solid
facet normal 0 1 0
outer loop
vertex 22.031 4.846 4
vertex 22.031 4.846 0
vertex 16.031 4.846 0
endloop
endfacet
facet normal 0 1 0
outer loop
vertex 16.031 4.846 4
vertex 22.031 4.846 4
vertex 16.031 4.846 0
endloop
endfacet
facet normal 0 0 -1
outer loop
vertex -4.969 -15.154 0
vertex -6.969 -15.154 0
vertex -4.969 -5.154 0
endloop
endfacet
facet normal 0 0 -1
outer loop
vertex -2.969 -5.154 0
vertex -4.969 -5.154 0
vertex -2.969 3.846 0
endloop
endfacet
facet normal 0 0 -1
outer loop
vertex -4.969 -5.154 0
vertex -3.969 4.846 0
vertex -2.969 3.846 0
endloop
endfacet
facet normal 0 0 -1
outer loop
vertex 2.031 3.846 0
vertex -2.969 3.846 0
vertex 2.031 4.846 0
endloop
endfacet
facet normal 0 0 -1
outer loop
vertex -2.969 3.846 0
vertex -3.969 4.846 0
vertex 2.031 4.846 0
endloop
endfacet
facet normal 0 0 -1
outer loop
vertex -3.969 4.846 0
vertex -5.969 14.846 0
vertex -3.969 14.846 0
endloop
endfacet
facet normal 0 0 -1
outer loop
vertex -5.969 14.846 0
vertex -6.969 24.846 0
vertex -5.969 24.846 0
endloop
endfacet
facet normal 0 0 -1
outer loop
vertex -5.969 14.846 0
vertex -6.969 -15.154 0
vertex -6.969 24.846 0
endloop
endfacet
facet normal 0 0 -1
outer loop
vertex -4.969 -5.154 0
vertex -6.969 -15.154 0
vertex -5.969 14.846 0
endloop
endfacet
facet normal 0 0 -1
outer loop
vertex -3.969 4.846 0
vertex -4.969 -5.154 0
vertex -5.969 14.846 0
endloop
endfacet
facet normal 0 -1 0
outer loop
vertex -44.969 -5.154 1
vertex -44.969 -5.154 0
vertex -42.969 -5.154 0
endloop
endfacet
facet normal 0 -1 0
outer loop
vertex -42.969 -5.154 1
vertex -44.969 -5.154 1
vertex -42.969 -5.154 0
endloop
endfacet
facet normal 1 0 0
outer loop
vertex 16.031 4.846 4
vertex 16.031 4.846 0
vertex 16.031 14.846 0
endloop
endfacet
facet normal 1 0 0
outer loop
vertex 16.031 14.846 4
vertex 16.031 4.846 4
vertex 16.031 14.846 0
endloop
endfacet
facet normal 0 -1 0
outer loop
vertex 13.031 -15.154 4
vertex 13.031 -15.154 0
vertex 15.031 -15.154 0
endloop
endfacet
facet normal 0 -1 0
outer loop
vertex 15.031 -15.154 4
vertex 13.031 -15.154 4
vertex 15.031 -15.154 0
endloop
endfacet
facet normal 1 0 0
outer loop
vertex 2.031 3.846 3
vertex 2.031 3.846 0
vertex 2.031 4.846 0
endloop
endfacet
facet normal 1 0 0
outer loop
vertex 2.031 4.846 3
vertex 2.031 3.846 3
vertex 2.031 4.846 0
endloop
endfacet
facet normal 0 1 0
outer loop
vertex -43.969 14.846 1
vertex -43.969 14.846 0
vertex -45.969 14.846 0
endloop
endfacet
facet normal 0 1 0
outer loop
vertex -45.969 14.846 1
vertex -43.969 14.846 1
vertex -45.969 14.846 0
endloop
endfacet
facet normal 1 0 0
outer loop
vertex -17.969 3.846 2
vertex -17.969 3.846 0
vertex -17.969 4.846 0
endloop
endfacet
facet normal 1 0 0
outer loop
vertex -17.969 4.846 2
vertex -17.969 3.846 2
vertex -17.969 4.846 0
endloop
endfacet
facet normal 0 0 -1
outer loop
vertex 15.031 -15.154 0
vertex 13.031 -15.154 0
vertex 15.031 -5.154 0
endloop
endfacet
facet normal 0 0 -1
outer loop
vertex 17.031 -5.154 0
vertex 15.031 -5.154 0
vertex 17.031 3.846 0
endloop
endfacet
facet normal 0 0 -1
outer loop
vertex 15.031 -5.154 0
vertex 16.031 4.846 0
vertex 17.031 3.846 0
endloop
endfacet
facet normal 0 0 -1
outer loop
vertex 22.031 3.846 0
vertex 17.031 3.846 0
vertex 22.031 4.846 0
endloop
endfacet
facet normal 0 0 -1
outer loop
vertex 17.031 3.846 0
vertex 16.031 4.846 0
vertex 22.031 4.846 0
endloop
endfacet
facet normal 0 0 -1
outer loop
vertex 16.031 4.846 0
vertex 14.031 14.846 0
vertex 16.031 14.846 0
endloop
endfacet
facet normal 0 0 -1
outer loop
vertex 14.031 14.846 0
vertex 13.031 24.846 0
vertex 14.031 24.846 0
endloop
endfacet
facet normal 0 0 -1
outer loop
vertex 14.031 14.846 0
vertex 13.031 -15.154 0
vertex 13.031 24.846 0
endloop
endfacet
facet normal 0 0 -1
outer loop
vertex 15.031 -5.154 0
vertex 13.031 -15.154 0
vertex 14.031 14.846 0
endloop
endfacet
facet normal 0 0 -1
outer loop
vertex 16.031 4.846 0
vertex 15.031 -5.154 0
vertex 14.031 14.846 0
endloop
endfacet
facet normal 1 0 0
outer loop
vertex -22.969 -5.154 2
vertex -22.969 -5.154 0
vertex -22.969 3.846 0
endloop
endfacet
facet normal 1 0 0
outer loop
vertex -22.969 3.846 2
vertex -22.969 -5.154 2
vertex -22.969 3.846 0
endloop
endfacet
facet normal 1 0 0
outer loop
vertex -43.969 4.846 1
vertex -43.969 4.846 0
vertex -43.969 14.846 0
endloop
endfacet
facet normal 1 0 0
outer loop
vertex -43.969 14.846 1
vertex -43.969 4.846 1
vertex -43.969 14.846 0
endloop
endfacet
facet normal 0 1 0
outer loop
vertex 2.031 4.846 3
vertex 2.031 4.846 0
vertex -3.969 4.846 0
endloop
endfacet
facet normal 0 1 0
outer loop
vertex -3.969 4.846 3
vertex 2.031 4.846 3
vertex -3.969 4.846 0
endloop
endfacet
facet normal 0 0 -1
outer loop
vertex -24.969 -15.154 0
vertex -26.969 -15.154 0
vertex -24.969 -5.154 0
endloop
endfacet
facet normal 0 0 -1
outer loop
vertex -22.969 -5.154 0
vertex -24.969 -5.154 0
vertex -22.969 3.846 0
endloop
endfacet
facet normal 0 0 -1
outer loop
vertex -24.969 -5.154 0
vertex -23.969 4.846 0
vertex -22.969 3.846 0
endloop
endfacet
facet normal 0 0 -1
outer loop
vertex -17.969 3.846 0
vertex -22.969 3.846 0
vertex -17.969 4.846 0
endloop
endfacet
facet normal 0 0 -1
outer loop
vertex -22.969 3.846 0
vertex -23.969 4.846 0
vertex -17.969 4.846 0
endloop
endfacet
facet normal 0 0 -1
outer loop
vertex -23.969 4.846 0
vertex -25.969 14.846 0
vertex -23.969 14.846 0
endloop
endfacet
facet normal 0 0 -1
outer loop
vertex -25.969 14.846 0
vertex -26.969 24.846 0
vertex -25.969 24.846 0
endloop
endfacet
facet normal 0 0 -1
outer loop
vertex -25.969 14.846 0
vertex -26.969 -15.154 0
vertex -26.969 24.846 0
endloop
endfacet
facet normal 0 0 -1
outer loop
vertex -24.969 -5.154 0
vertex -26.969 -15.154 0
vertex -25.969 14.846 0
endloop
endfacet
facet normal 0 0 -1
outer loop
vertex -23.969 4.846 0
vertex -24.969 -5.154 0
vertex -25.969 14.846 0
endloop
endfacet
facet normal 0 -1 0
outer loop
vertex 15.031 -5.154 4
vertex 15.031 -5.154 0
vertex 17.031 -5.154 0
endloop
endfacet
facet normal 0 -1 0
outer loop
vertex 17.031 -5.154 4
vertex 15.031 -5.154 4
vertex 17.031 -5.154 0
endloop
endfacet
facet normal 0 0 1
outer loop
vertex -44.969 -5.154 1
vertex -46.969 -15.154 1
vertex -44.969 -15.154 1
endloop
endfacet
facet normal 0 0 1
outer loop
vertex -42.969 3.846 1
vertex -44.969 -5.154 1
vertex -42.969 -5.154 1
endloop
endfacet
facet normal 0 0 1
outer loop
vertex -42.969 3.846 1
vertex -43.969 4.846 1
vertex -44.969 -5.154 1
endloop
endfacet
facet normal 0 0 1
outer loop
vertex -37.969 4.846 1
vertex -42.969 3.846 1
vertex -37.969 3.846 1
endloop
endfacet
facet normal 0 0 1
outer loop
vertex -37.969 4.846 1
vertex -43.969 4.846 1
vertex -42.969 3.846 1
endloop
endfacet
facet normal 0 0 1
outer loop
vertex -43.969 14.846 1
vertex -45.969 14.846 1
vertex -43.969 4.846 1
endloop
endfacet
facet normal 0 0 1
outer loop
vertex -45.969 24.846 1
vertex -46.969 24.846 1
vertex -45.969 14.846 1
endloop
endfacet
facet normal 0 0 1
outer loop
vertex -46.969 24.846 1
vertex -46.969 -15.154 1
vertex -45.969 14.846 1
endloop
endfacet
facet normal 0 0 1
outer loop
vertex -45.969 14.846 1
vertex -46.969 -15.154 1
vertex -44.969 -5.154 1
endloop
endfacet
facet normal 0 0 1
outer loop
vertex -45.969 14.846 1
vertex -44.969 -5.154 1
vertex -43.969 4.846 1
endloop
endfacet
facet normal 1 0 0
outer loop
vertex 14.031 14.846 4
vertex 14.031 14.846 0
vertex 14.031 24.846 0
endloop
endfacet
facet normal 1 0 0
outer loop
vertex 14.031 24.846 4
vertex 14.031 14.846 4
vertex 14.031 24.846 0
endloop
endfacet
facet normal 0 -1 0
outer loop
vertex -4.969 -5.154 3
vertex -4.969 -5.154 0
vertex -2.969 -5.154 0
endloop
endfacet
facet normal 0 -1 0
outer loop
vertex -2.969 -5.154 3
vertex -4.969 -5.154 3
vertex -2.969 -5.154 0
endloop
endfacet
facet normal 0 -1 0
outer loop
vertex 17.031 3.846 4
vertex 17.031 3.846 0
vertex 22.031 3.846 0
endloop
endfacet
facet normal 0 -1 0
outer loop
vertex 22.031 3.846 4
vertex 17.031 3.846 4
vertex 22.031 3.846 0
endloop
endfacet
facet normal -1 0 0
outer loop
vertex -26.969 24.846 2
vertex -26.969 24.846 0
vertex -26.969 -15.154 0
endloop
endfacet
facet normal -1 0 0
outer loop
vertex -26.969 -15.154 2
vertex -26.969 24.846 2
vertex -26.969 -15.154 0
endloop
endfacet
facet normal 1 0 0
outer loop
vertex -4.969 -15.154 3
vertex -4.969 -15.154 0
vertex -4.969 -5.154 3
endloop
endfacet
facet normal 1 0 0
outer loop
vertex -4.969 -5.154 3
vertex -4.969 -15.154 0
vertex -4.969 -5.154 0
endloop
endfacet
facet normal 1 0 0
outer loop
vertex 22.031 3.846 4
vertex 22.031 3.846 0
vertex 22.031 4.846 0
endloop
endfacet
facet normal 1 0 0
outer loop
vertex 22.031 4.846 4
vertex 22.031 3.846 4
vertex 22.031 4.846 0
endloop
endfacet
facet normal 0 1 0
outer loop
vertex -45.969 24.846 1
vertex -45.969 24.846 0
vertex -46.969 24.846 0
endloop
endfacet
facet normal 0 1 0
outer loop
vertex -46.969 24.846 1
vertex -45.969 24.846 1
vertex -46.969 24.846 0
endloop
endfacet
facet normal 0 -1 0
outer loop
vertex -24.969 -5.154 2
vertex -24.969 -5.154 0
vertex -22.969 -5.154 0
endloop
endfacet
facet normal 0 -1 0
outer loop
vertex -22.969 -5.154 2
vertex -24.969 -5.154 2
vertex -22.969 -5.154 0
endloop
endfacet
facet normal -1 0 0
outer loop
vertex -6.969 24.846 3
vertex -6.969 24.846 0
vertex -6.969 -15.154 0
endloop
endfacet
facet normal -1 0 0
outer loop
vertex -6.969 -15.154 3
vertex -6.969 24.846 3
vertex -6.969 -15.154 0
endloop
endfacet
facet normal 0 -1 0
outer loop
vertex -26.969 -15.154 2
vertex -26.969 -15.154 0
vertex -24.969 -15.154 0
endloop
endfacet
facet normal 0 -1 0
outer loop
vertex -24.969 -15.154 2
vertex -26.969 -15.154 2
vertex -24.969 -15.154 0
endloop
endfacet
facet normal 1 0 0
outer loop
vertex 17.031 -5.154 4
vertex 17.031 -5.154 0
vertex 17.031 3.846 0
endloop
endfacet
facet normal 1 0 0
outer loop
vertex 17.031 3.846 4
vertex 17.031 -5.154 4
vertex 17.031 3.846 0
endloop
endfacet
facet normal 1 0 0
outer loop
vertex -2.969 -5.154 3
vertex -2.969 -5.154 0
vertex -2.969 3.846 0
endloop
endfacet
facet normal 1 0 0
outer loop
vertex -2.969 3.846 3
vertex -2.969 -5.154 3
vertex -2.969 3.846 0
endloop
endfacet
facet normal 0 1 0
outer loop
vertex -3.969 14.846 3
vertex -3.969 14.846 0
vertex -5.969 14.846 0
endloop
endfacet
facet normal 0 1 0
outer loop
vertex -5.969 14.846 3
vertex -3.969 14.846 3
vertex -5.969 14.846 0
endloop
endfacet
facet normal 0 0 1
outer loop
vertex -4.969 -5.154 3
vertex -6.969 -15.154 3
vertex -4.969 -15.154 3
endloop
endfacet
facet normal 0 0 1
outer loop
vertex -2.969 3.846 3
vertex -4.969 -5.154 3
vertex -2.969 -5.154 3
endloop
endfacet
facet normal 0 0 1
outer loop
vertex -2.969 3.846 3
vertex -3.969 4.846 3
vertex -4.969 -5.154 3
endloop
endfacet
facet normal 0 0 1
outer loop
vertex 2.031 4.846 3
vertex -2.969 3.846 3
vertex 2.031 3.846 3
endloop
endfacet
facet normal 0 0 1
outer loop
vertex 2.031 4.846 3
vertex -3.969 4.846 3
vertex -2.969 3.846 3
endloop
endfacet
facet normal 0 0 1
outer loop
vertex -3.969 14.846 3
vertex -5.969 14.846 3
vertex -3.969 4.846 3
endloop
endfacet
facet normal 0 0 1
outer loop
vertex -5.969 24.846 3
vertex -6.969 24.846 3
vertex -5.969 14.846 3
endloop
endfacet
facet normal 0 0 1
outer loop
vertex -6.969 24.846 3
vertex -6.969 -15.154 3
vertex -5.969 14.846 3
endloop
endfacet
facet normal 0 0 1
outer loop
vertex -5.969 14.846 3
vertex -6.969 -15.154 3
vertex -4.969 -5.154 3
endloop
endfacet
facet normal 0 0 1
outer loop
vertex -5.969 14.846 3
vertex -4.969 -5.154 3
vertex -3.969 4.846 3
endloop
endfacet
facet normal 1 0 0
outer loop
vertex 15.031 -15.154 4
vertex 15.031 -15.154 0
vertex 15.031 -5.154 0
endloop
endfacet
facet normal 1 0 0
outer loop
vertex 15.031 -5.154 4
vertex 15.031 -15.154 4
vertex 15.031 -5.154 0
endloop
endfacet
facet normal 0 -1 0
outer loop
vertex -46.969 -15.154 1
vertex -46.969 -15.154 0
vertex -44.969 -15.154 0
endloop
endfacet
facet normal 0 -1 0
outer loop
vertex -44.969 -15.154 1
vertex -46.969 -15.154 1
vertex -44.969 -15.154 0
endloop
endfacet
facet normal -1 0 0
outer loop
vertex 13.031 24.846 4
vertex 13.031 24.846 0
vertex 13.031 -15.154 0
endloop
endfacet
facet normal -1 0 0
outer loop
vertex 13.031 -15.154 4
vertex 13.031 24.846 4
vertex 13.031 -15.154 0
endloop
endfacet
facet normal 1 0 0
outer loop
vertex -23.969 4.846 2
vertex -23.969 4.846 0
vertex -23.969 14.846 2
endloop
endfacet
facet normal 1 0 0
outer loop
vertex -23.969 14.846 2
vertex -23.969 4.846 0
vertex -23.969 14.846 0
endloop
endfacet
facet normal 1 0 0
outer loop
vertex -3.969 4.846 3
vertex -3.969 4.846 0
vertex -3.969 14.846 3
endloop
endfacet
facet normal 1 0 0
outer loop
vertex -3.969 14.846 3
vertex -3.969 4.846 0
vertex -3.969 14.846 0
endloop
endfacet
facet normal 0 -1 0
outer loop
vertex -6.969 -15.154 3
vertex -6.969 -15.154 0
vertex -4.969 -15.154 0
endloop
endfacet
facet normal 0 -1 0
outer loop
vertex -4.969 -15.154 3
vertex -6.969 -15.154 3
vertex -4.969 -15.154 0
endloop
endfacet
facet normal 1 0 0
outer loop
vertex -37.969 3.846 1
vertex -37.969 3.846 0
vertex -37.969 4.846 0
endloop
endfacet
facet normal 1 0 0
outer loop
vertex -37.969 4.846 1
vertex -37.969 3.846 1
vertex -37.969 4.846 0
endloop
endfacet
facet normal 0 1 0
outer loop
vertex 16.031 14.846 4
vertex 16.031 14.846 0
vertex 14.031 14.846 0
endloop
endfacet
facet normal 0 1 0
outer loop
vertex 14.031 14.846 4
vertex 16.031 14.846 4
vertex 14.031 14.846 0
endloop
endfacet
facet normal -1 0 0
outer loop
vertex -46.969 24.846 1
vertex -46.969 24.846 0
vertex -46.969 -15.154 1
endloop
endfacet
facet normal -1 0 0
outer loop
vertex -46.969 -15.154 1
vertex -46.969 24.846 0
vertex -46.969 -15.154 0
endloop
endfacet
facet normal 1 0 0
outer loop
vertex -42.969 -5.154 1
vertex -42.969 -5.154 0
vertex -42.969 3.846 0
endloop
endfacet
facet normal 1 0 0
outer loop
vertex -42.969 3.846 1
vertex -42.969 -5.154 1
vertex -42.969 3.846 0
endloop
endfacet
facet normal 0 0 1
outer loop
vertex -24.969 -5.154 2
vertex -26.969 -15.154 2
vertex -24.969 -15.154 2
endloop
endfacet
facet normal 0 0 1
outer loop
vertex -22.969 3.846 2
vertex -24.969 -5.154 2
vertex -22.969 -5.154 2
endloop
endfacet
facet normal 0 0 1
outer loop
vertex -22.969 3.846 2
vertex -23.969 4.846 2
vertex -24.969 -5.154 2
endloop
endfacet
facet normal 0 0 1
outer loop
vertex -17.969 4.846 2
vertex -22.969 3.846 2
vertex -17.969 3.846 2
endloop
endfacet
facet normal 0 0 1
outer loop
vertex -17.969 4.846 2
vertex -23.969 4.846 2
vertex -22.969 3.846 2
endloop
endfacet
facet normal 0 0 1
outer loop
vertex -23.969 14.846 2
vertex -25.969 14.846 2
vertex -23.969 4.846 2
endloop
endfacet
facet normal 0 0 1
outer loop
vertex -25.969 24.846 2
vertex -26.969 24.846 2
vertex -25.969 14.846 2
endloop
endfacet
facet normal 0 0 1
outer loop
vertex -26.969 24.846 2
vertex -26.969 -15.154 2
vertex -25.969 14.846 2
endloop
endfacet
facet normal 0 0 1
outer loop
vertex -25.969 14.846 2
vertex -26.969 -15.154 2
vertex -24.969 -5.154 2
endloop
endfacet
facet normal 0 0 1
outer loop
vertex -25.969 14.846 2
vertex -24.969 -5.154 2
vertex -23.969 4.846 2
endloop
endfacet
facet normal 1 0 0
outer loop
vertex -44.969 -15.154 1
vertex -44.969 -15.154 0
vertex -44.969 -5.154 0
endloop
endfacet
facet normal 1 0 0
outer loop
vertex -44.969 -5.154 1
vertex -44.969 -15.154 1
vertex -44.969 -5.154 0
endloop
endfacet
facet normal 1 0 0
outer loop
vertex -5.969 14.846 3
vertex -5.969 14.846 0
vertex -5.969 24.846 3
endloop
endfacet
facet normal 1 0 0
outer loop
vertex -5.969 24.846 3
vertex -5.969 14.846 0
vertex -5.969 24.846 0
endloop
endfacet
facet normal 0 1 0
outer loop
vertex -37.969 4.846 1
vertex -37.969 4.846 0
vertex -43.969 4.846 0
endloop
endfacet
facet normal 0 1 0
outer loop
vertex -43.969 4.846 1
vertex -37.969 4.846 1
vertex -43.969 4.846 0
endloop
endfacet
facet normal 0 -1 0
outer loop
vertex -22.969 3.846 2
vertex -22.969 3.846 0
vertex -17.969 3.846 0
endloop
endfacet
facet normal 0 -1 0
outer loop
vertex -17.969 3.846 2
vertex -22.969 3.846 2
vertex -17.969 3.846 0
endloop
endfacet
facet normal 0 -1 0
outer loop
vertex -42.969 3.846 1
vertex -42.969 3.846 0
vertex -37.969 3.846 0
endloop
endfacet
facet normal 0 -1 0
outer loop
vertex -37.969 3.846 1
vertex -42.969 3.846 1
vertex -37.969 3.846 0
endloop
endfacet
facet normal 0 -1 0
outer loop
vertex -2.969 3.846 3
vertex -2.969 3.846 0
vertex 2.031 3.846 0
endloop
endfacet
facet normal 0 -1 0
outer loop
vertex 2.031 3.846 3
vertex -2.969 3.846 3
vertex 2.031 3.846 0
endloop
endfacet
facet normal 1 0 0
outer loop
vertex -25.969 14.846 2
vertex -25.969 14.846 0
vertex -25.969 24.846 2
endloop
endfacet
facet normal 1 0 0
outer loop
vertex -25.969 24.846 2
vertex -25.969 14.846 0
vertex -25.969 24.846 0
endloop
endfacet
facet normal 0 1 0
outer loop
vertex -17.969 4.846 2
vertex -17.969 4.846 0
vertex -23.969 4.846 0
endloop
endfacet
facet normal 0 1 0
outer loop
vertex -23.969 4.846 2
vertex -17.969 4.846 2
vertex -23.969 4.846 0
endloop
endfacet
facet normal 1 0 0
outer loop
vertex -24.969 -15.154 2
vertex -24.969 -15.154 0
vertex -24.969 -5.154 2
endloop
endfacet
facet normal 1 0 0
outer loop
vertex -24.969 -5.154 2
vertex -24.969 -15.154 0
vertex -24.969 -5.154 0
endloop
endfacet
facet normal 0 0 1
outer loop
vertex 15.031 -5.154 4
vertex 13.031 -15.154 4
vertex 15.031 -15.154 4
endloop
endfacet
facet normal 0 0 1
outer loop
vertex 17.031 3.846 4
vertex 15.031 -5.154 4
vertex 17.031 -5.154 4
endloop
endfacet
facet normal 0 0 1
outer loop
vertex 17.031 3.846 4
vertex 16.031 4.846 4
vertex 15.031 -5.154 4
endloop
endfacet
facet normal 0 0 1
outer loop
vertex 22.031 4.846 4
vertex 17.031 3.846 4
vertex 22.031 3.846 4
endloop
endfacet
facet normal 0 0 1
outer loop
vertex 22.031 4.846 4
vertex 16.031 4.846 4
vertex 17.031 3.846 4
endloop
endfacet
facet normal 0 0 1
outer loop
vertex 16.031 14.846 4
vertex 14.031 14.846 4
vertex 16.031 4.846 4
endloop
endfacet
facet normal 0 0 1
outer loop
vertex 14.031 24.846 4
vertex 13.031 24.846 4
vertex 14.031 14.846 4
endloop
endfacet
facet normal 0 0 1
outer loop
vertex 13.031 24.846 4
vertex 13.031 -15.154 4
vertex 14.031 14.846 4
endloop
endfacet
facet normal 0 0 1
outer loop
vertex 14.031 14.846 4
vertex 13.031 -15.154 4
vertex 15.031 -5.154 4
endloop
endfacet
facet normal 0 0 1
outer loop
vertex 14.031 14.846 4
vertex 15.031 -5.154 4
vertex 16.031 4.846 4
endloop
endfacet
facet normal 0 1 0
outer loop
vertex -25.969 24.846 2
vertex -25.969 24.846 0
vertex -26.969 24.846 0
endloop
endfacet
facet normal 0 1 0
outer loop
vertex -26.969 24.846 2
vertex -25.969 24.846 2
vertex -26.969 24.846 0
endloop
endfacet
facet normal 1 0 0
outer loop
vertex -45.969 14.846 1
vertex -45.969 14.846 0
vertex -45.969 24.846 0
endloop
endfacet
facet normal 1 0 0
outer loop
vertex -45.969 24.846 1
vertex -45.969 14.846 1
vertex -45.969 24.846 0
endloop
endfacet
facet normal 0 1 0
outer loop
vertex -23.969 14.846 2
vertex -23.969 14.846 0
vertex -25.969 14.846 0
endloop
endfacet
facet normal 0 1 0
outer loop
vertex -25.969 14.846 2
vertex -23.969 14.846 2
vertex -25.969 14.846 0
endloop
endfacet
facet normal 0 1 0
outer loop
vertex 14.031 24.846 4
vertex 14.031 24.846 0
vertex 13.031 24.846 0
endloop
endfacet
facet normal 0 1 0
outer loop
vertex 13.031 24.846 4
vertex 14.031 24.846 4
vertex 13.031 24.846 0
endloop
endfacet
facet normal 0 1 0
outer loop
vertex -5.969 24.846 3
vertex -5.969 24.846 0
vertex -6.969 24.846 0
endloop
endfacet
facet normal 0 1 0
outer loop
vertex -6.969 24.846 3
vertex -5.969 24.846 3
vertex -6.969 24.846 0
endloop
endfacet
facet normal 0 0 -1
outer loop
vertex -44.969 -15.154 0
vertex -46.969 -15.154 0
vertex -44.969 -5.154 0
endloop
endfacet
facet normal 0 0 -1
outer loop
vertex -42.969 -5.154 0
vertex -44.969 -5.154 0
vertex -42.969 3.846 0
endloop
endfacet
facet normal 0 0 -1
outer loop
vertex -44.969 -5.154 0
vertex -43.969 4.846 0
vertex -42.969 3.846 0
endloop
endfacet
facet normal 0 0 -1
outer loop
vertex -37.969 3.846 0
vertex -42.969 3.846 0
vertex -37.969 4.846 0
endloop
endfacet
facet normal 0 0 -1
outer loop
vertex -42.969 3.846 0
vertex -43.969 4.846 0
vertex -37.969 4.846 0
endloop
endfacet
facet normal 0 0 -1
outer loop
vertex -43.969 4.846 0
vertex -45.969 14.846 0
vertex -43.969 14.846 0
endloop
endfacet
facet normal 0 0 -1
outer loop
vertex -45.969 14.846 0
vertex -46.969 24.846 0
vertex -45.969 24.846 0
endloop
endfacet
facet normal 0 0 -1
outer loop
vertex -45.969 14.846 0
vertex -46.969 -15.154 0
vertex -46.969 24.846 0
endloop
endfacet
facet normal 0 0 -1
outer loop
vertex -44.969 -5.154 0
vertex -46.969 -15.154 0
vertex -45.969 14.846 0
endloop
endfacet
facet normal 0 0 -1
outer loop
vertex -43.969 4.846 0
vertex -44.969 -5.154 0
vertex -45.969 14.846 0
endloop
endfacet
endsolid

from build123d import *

# Parameters (mm, degrees)
F1_DEPTH = 1
F2_DEPTH = 2
F3_DEPTH = 3
F4_DEPTH = 4


with BuildPart() as f1:
    # F0 (on Top) → F1 (new body)
    with BuildSketch(Plane.XY):
        Polygon((-45.969496, 24.845806), (-46.969496, 24.845806), (-46.969496, -15.154194), (-45.969496, -15.154194), (-45.969496, 14.845806), align=None)
        Polygon((-44.969496, 14.845806), (-45.969496, 14.845806), (-45.969496, -15.154194), (-44.969496, -15.154194), (-44.969496, -5.154194), align=None)
        Polygon((-43.969496, 14.845806), (-44.969496, 14.845806), (-44.969496, -5.154194), (-43.969496, -5.154194), (-43.969496, 4.845806), align=None)
        Polygon((-43.969496, 4.845806), (-43.969496, -5.154194), (-42.969496, -5.154194), (-42.969496, 3.845806), (-42.969496, 4.845806), align=None)
        Polygon((-37.969496, 4.845806), (-42.969496, 4.845806), (-42.969496, 3.845806), (-39.983839, 3.845806), (-37.969496, 3.845806), align=None)
    extrude(amount=F1_DEPTH)


with BuildPart() as f2:
    # F0 (on Top) → F2 (new body)
    with BuildSketch(Plane.XY):
        Polygon((-25.969496, 14.845806), (-25.969496, 24.845806), (-26.969496, 24.845806), (-26.969496, -15.154194), (-25.969496, -15.154194), align=None)
        Polygon((-24.969496, 14.845806), (-25.969496, 14.845806), (-25.969496, -15.154194), (-24.969496, -15.154194), (-24.969496, -5.154194), align=None)
        Polygon((-23.969496, 14.845806), (-24.969496, 14.845806), (-24.969496, -5.154194), (-23.969496, -5.154194), (-23.969496, 4.845806), align=None)
        Polygon((-23.969496, 4.845806), (-23.969496, -5.154194), (-22.969496, -5.154194), (-22.969496, 3.845806), (-22.969496, 4.845806), align=None)
        Polygon((-17.969496, 4.845806), (-22.969496, 4.845806), (-22.969496, 3.845806), (-19.983839, 3.845806), (-17.969496, 3.845806), align=None)
    extrude(amount=F2_DEPTH)


with BuildPart() as f3:
    # F0 (on Top) → F3 (new body)
    with BuildSketch(Plane.XY):
        Polygon((-5.969496, 14.845806), (-5.969496, 24.845806), (-6.969496, 24.845806), (-6.969496, -15.154194), (-5.969496, -15.154194), align=None)
        Polygon((-3.969496, 14.845806), (-4.969496, 14.845806), (-4.969496, -5.154194), (-3.969496, -5.154194), (-3.969496, 4.845806), align=None)
        Polygon((-3.969496, 4.845806), (-3.969496, -5.154194), (-2.969496, -5.154194), (-2.969496, 3.845806), (-2.969496, 4.845806), align=None)
        Polygon((-4.969496, 14.845806), (-5.969496, 14.845806), (-5.969496, -15.154194), (-4.969496, -15.154194), (-4.969496, -5.154194), align=None)
        Polygon((2.030504, 4.845806), (-2.969496, 4.845806), (-2.969496, 3.845806), (0.016161, 3.845806), (2.030504, 3.845806), align=None)
    extrude(amount=F3_DEPTH)


with BuildPart() as f4:
    # F0 (on Top) → F4 (new body)
    with BuildSketch(Plane.XY):
        Polygon((14.030504, 14.845806), (14.030504, 24.845806), (13.030504, 24.845806), (13.030504, -15.154194), (14.030504, -15.154194), align=None)
        Polygon((15.030504, 14.845806), (14.030504, 14.845806), (14.030504, -15.154194), (15.030504, -15.154194), (15.030504, -5.154194), align=None)
        Polygon((16.030504, 14.845806), (15.030504, 14.845806), (15.030504, -5.154194), (16.030504, -5.154194), (16.030504, 4.845806), align=None)
        Polygon((16.030504, 4.845806), (16.030504, -5.154194), (17.030504, -5.154194), (17.030504, 3.845806), (17.030504, 4.845806), align=None)
        Polygon((22.030504, 4.845806), (17.030504, 4.845806), (17.030504, 3.845806), (20.016161, 3.845806), (22.030504, 3.845806), align=None)
    extrude(amount=F4_DEPTH)


solid = Compound([f1.part, f2.part, f3.part, f4.part])
